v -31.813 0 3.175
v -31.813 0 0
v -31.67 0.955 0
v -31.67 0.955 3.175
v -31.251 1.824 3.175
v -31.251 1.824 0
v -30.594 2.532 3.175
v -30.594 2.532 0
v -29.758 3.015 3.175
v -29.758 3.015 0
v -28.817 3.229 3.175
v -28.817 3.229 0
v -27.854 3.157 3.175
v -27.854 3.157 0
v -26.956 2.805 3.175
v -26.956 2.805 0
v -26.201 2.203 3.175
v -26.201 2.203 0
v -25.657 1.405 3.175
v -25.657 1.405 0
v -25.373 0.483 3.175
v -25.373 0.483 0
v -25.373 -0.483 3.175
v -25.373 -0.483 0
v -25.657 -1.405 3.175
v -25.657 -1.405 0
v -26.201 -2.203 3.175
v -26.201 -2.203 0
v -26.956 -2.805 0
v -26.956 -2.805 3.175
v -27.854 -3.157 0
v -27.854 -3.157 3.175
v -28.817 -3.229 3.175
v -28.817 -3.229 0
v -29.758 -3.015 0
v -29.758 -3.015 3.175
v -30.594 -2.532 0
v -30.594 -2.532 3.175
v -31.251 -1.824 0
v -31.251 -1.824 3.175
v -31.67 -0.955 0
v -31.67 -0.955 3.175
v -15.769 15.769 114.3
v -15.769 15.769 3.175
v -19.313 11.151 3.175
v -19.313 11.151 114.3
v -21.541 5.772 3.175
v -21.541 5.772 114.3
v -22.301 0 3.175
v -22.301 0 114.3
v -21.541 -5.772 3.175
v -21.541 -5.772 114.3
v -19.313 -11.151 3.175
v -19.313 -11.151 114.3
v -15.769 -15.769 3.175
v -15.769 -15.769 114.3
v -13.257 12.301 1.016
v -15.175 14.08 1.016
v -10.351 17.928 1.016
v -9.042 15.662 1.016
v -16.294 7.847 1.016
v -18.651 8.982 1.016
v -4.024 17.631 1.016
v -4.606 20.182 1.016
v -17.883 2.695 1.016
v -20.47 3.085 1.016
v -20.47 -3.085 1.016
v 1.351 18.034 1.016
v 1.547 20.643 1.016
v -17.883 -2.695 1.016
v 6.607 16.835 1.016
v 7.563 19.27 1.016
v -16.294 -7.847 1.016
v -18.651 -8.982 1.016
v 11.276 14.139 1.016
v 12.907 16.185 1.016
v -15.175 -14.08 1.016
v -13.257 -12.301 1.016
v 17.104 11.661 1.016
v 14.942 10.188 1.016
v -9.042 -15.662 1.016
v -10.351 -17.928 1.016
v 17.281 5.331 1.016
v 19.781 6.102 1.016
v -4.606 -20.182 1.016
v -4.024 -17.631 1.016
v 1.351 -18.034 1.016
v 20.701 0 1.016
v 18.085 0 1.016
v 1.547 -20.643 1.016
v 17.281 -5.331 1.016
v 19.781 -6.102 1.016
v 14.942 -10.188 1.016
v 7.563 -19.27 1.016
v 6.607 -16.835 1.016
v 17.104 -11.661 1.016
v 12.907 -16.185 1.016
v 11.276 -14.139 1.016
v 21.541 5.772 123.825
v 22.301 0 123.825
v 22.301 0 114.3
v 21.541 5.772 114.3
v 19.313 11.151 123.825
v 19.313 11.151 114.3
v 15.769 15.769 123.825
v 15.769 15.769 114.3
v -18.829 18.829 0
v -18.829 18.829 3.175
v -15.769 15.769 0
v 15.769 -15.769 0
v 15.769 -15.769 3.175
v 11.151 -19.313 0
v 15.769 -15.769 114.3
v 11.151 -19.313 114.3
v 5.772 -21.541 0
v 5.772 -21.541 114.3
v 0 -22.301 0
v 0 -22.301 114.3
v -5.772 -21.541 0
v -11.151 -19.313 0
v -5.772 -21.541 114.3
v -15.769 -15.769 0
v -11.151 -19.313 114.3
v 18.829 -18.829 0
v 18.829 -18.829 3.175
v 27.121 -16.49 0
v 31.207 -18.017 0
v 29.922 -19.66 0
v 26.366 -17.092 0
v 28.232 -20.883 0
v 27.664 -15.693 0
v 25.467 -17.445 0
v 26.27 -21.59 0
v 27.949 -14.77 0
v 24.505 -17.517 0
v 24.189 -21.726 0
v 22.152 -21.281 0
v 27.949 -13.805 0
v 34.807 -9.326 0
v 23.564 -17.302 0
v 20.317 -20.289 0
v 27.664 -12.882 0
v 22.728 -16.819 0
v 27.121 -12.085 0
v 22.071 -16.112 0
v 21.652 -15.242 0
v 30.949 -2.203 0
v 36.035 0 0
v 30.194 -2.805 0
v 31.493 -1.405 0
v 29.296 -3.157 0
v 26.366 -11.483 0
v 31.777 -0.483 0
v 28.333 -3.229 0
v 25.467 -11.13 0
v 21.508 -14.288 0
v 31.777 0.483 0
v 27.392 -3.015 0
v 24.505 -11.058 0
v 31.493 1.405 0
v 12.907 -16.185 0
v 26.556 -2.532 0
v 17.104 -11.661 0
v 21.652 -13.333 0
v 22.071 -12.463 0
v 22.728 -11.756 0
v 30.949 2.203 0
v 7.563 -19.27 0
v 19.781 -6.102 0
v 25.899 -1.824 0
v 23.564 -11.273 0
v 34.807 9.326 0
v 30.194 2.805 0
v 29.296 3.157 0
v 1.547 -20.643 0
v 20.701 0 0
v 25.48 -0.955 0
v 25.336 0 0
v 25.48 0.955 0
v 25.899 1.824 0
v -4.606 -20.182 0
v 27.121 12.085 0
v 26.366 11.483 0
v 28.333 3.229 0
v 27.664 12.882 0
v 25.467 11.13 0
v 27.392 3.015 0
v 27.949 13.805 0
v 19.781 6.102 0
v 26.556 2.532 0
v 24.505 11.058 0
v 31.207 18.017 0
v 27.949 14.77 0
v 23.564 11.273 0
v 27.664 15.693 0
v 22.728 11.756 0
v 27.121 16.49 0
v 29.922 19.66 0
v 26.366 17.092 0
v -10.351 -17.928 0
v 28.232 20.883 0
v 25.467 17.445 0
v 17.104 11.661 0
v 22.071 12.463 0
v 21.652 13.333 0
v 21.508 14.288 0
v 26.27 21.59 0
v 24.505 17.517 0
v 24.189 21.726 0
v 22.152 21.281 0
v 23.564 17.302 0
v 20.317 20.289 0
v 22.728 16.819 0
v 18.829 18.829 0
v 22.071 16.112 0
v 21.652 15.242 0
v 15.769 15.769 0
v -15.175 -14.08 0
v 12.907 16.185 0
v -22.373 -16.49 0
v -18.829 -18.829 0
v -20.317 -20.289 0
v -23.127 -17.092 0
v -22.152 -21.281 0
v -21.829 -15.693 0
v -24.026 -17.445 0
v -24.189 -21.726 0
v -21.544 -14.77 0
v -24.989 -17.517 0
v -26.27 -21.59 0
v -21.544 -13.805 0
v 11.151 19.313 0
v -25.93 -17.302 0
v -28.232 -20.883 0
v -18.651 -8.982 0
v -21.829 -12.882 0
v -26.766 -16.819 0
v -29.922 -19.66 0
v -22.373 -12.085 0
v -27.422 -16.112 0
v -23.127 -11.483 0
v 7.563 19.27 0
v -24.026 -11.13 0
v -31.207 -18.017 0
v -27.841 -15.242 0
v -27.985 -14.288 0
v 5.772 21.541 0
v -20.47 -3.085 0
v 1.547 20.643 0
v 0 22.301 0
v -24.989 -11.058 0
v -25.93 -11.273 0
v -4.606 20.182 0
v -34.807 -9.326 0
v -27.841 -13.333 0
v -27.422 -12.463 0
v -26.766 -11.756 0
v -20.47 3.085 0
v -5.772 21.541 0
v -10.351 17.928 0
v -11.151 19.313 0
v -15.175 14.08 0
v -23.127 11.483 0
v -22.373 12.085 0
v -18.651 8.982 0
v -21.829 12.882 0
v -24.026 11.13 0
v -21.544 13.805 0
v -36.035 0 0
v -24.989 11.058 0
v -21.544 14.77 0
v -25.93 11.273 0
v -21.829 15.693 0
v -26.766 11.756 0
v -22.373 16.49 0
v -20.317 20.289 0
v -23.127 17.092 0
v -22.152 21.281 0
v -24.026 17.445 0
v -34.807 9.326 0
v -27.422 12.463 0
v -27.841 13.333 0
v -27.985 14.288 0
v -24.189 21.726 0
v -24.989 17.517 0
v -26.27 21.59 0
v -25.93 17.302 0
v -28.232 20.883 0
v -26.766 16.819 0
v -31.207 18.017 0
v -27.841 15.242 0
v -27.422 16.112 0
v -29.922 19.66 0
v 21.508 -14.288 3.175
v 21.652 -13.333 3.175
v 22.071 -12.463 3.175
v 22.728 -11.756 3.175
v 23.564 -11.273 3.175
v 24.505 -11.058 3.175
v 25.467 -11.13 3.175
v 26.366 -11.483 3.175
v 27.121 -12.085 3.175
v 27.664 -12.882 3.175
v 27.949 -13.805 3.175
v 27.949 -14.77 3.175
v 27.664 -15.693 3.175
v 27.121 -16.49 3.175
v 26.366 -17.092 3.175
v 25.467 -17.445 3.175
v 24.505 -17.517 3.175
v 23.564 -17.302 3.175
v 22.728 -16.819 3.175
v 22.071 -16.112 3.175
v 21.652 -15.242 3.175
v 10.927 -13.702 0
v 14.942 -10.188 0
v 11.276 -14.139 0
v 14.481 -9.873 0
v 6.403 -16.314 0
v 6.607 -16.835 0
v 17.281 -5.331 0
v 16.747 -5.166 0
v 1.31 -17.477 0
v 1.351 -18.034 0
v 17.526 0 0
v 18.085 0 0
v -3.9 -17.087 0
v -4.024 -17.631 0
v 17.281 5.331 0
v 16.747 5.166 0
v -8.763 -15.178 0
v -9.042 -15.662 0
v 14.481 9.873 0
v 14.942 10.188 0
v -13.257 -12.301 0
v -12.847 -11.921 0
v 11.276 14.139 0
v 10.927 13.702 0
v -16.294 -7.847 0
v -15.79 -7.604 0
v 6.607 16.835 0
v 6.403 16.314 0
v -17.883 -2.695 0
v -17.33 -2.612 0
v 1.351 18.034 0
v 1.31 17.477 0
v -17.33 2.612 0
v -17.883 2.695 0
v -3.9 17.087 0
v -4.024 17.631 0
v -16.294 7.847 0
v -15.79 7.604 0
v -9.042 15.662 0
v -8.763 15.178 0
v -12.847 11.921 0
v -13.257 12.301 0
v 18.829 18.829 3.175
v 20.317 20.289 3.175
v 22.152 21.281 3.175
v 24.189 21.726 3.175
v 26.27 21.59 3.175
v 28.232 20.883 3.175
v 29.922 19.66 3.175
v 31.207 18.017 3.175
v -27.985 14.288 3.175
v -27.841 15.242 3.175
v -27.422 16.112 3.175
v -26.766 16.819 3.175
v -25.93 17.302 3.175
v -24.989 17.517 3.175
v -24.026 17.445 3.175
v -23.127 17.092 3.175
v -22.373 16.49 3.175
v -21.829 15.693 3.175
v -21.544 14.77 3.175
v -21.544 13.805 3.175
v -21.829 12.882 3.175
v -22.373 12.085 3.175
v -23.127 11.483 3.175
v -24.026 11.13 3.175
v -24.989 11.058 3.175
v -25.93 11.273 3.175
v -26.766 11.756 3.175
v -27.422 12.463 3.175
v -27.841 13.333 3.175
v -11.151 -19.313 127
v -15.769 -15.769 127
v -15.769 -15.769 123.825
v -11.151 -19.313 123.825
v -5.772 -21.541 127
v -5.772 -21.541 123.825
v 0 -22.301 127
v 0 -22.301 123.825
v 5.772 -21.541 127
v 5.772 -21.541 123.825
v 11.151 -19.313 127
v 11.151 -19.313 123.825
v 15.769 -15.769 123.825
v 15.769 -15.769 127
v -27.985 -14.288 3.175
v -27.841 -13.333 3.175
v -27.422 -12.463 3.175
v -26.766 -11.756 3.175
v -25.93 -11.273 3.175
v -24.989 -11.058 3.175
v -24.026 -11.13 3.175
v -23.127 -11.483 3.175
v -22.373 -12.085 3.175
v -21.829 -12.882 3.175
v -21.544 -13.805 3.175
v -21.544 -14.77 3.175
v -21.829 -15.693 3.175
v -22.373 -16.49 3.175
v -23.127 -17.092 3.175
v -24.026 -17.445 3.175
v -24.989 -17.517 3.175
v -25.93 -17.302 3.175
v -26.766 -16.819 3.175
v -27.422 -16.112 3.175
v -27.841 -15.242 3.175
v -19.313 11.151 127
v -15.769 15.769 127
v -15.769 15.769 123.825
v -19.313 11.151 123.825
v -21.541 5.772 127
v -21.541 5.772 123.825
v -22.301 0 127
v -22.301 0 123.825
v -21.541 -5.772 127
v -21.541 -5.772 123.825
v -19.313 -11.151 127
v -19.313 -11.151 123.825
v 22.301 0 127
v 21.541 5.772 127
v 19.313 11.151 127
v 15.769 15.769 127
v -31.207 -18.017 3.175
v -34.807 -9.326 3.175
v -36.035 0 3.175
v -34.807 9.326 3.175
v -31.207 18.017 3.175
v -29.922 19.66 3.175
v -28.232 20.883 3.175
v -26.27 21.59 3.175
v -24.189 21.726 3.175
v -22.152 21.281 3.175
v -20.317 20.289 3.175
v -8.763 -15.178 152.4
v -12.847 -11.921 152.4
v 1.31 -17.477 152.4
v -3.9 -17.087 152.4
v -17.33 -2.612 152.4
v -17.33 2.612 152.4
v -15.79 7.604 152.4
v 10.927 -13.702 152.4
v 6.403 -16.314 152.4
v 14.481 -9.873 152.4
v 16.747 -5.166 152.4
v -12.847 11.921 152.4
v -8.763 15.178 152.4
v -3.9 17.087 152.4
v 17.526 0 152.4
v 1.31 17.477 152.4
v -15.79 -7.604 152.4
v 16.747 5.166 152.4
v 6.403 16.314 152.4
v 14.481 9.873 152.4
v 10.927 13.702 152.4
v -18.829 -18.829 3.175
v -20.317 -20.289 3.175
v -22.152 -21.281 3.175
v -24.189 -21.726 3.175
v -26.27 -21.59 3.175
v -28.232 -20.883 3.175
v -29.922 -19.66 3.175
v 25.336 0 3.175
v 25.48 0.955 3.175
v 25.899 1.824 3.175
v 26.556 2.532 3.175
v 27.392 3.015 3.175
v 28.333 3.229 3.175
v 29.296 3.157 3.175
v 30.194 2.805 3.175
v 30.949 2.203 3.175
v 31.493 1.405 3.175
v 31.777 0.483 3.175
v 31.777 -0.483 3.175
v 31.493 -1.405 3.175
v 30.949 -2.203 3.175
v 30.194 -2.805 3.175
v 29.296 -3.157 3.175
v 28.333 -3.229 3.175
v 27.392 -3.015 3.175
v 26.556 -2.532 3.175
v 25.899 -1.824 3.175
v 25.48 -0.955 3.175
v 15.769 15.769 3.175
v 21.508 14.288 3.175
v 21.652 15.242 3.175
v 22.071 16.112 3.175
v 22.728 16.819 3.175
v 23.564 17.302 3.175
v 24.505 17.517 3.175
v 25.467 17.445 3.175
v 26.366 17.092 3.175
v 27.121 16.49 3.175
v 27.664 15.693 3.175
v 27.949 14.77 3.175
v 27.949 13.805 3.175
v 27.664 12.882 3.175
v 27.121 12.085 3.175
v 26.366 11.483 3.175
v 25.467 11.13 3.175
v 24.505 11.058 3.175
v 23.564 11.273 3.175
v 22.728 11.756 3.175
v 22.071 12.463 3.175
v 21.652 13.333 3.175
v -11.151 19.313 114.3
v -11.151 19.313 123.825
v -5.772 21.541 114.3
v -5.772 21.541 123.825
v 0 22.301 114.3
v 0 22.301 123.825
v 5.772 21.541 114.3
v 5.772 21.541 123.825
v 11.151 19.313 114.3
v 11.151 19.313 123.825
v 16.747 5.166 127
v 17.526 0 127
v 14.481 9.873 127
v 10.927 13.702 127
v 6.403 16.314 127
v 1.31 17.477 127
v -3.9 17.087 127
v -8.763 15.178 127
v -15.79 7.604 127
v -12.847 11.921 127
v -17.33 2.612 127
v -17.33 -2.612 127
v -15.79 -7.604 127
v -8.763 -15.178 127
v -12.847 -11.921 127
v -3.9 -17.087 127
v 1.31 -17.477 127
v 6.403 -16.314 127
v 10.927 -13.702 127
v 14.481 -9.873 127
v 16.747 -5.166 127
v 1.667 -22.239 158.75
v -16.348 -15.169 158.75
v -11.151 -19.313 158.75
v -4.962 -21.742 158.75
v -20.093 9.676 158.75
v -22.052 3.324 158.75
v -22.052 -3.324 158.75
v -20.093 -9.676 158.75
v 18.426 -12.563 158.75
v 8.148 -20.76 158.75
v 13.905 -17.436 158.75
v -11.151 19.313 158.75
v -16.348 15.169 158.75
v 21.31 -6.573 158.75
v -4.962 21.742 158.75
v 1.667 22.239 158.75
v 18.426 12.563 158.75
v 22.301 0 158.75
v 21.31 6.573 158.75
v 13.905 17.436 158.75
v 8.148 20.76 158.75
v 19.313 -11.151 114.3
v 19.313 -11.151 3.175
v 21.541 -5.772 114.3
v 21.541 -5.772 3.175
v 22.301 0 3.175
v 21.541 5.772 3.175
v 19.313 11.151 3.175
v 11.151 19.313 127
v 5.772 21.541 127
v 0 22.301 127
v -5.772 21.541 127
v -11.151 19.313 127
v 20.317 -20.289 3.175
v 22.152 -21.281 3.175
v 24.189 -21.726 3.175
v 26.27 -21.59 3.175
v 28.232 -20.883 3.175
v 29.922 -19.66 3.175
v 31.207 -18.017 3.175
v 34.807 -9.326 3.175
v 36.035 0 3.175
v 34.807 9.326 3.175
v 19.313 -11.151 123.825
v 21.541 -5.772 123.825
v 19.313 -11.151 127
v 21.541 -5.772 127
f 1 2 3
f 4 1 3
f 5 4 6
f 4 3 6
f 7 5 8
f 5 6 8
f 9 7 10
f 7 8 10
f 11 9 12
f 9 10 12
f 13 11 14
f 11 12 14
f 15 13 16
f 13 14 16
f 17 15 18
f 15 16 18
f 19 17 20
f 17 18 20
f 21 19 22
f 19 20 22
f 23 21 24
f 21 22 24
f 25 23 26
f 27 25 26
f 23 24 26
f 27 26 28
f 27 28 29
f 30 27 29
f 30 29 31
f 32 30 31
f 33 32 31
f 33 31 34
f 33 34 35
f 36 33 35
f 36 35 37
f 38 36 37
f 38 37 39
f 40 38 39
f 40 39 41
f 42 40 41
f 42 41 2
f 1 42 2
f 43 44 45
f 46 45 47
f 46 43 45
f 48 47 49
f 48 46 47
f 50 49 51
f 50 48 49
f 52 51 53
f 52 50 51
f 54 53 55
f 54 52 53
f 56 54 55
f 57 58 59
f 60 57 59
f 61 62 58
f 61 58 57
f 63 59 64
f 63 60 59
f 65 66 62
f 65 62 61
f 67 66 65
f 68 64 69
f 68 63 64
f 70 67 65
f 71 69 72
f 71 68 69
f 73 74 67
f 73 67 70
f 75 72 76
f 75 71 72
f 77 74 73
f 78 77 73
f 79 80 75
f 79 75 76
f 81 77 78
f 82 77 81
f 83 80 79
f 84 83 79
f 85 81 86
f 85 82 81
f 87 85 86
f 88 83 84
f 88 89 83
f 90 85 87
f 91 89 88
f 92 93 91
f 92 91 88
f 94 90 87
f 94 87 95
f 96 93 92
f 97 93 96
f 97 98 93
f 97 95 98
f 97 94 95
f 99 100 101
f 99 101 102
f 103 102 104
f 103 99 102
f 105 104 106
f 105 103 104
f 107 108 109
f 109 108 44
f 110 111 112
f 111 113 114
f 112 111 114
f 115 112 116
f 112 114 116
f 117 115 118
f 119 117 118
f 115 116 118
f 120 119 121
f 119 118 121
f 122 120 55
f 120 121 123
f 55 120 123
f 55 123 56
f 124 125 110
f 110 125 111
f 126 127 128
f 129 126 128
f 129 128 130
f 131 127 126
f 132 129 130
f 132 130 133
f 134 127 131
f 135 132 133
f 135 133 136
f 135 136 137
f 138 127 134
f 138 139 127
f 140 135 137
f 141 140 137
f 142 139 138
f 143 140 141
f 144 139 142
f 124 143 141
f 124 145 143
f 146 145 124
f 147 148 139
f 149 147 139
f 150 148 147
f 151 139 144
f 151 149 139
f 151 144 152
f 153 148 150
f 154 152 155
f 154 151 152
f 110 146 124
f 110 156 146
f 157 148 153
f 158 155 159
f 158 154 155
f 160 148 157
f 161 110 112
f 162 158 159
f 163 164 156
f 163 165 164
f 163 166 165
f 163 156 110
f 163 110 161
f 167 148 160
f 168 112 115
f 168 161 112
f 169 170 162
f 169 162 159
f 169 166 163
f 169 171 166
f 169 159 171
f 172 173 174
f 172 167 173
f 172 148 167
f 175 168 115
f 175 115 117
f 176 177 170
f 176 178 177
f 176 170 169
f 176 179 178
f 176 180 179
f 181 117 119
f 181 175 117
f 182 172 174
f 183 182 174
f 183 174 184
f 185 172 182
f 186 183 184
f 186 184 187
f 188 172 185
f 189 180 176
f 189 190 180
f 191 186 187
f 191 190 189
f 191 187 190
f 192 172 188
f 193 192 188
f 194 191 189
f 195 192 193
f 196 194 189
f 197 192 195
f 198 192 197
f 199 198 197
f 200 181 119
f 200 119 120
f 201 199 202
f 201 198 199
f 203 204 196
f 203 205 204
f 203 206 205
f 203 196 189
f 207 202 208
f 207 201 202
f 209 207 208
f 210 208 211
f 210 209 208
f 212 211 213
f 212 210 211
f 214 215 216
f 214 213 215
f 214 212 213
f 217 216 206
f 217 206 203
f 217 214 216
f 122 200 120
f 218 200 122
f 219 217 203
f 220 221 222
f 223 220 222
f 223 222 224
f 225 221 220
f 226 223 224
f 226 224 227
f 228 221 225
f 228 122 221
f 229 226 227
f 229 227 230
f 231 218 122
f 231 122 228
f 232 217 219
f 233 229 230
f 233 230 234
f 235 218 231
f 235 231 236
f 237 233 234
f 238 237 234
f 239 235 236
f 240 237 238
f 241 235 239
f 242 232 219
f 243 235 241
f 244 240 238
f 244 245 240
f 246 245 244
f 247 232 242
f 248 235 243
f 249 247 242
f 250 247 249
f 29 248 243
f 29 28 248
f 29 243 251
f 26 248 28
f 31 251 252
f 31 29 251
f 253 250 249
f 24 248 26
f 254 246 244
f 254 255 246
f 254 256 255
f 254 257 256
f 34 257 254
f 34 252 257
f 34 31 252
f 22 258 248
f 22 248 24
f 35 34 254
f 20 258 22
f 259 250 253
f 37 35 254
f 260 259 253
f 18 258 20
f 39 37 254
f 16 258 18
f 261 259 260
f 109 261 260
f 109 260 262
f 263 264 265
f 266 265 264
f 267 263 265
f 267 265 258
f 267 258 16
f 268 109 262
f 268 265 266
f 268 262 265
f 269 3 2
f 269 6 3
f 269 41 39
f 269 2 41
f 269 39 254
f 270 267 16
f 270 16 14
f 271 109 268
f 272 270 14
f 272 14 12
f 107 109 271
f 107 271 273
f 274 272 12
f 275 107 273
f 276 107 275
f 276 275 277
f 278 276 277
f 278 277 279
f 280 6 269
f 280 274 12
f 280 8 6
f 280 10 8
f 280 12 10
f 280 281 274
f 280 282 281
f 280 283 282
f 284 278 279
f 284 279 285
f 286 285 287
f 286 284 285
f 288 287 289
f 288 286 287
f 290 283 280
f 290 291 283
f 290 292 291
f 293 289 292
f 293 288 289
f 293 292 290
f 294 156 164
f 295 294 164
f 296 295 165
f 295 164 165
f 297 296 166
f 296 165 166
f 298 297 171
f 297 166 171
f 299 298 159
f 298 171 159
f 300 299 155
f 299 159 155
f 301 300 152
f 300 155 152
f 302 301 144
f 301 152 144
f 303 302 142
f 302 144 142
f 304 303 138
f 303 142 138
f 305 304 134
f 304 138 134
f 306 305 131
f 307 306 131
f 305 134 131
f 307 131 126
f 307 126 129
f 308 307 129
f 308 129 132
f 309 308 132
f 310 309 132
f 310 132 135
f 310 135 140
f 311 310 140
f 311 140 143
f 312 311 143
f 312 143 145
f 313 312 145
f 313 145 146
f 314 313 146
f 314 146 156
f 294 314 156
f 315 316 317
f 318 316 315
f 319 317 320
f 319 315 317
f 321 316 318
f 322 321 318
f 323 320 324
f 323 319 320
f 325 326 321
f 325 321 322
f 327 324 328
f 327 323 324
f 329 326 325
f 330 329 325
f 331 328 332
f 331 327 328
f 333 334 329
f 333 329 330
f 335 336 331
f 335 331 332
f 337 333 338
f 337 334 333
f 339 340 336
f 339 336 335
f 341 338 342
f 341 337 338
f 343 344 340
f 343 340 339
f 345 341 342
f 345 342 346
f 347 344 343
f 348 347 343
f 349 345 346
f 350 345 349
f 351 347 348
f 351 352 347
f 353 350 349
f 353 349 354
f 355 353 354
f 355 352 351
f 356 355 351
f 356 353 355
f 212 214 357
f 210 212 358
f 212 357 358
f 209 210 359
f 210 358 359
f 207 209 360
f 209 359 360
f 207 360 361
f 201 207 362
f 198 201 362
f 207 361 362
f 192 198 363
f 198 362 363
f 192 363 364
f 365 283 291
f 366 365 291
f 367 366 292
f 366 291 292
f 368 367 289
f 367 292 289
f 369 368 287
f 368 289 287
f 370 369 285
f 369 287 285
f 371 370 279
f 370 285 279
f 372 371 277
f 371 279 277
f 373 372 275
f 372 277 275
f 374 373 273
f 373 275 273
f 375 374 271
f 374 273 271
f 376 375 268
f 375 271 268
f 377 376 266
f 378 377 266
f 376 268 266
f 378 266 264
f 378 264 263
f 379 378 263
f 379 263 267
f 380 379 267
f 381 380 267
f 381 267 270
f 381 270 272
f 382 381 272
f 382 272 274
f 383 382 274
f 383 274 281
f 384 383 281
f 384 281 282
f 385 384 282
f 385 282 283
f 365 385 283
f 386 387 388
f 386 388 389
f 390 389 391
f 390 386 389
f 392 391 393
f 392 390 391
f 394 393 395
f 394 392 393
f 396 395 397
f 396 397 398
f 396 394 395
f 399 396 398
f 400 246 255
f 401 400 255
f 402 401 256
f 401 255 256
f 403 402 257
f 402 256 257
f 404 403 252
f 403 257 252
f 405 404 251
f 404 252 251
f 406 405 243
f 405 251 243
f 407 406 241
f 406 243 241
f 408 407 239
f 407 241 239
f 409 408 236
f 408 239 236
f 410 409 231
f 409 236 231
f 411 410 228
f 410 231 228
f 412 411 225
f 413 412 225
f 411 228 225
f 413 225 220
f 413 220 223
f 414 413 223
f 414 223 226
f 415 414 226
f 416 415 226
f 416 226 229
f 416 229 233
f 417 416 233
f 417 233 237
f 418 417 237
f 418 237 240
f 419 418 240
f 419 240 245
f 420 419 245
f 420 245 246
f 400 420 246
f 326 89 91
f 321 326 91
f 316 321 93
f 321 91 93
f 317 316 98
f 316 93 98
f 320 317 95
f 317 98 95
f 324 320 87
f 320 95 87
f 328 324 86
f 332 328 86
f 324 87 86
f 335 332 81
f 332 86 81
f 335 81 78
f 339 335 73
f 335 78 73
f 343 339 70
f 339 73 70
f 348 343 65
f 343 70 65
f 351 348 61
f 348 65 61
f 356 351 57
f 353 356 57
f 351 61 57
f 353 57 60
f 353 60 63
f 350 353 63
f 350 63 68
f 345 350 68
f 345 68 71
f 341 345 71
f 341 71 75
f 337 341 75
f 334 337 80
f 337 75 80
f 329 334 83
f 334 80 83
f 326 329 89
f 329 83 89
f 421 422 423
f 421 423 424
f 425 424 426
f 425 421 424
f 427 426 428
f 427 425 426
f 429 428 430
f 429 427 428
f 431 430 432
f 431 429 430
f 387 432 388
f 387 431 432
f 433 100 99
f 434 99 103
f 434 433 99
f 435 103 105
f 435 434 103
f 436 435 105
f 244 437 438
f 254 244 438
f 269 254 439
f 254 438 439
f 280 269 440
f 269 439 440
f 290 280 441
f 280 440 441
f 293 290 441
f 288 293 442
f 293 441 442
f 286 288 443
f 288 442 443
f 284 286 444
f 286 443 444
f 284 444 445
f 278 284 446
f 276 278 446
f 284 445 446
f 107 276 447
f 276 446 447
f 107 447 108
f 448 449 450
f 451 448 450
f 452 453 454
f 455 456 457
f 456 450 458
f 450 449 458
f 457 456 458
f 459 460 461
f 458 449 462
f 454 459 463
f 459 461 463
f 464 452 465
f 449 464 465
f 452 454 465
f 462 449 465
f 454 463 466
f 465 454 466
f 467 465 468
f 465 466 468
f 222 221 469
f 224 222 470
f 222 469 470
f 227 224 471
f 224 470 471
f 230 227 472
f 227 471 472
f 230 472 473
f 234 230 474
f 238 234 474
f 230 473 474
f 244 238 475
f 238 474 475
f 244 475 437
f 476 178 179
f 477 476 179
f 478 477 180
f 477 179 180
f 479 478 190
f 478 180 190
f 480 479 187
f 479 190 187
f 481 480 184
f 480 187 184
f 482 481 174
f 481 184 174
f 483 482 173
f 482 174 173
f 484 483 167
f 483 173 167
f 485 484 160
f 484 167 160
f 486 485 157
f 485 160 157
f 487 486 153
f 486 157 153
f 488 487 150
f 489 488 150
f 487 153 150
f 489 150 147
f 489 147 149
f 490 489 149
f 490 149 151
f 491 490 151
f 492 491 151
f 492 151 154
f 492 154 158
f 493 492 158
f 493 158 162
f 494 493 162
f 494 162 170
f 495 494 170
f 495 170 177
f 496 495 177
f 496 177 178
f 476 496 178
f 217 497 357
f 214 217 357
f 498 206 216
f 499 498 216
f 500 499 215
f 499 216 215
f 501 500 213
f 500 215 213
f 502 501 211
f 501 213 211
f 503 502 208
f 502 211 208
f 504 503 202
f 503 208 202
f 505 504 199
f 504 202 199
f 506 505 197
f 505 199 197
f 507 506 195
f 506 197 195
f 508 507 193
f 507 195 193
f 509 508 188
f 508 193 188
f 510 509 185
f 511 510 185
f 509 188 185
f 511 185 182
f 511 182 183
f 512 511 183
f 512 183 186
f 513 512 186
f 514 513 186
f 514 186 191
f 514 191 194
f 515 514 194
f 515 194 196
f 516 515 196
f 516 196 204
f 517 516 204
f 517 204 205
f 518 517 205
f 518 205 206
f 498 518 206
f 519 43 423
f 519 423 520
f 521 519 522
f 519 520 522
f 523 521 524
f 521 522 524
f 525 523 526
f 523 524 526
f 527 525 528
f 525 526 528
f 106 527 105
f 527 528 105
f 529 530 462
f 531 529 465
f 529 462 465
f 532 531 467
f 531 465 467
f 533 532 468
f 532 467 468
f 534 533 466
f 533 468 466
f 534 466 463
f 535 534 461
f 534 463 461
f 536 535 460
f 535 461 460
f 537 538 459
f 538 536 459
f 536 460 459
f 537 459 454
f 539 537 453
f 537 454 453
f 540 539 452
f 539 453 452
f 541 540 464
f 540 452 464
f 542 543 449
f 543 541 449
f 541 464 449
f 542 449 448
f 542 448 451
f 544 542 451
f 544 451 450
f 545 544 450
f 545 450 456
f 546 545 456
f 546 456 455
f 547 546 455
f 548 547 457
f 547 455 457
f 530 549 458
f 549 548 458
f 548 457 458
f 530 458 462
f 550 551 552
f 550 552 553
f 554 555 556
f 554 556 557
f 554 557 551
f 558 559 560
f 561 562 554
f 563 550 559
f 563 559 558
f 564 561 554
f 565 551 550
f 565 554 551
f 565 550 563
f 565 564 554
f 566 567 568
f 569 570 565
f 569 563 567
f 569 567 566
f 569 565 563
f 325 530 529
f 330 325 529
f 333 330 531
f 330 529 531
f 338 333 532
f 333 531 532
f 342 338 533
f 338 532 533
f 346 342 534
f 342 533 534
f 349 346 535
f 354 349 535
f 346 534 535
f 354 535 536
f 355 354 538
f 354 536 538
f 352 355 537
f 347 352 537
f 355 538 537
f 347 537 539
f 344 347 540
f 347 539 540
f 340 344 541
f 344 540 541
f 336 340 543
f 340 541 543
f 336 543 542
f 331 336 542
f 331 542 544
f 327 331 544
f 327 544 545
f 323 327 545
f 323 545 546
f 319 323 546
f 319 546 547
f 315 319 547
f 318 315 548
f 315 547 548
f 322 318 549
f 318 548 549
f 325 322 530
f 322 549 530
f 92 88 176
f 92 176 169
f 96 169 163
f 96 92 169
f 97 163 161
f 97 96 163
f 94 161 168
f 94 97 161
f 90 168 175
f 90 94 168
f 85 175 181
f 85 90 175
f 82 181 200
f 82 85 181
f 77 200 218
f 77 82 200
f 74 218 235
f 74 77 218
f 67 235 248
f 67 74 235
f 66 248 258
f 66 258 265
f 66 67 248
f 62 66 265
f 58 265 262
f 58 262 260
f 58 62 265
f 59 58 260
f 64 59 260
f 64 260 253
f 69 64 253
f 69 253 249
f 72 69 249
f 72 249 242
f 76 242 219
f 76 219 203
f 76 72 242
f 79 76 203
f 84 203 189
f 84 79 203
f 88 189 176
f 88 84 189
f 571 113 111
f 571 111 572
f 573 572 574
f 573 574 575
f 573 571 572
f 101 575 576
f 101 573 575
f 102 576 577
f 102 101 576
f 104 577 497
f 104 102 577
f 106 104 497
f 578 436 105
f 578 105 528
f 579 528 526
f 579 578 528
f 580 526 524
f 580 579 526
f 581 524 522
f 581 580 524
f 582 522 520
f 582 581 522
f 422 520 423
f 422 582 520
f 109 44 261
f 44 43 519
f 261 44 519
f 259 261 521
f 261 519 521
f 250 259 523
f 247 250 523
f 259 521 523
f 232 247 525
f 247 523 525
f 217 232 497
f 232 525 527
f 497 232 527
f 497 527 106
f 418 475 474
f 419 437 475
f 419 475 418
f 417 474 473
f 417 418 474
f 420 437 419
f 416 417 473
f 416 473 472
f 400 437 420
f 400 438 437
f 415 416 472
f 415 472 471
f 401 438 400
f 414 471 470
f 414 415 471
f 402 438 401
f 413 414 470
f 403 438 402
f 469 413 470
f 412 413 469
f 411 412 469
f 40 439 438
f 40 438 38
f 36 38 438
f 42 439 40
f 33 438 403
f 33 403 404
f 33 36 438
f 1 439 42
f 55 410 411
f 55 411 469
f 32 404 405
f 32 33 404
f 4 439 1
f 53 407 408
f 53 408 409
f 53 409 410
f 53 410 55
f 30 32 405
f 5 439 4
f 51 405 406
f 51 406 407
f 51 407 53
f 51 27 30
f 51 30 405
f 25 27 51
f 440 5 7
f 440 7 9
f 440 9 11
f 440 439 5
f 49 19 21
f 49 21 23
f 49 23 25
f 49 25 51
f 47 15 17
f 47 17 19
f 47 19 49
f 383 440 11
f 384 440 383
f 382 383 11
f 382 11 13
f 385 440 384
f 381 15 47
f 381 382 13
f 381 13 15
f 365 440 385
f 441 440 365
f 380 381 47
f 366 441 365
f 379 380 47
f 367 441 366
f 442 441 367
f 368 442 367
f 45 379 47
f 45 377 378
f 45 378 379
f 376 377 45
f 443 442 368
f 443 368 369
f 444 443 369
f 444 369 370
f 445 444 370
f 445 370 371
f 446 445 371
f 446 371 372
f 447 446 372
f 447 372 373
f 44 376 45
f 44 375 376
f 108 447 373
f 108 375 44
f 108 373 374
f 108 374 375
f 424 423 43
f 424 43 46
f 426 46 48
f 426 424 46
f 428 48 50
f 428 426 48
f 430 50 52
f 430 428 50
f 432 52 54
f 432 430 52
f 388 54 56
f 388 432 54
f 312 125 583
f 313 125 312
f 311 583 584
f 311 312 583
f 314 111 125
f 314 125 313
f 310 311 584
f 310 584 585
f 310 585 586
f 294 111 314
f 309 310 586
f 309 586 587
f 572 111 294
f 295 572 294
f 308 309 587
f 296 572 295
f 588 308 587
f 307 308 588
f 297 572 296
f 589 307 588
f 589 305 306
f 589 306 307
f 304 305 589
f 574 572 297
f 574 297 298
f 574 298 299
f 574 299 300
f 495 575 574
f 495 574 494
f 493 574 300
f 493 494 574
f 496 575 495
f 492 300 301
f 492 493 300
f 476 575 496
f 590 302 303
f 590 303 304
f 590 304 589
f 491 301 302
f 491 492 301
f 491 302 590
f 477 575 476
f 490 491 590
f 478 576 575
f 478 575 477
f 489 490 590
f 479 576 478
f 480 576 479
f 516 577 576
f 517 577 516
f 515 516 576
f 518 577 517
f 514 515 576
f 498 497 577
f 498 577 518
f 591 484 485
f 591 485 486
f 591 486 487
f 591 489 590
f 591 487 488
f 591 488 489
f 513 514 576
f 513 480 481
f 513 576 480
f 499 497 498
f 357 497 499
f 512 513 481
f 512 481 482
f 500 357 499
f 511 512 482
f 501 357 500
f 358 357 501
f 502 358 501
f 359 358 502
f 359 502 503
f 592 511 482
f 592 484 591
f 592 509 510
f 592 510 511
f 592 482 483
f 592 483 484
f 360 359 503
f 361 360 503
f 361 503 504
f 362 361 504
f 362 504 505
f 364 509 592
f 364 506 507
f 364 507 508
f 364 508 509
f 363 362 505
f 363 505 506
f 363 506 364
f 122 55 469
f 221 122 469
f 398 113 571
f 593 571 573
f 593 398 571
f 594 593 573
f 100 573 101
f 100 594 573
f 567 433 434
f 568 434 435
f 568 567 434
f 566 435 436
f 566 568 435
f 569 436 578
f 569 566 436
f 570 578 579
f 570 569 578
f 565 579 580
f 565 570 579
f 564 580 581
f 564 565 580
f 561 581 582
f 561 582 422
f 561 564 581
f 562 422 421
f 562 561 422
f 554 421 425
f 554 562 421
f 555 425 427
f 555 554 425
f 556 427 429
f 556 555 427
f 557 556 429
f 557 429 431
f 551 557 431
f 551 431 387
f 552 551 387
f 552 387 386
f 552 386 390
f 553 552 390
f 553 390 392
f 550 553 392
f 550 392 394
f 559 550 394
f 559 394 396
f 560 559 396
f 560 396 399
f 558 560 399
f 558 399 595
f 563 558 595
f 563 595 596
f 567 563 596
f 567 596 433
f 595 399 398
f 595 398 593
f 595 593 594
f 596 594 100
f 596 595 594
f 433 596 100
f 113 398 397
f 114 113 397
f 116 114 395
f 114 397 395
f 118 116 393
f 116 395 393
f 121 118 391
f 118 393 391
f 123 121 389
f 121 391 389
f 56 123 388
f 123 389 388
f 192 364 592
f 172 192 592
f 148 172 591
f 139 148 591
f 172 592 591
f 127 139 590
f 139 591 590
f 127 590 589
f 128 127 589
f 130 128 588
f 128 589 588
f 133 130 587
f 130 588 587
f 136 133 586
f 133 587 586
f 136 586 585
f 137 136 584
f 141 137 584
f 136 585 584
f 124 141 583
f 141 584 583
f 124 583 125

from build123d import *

# Parameters (mm, degrees)
SKETCH1_R            = 21.082
SKETCH1_R_2          = 17.526
BOSS_EXTRUDE1_DEPTH  = 254
BOSS_EXTRUDE2_START  = 6.35
SKETCH2_R            = 21.082
BOSS_EXTRUDE2_DEPTH  = 6.35
SKETCH3_R            = 25.868376463
CUT_EXTRUDE1_DEPTH   = 127
SKETCH4_R            = 34.925
SKETCH4_R_2          = 19.091061219
BOSS_EXTRUDE3_DEPTH  = 3.175
CUT_EXTRUDE2_DEPTH   = 143.203142546
CIRPATTERN1_COUNT    = 12
SKETCH6_R            = 21.082
CUT_EXTRUDE3_DEPTH   = 6.35
SKETCH7_R            = 21.082
BOSS_EXTRUDE4_DEPTH  = 6.35
CUT_EXTRUDE5_DEPTH   = 137.26632471
BOSS_EXTRUDE5_DEPTH  = 3.175
SKETCH13_R           = 20.701
SKETCH13_R_2         = 18.0848
CUT_EXTRUDE6_DEPTH   = 1.016
SKETCH14_R           = 22.3012
SKETCH14_R_2         = 20.701
BOSS_EXTRUDE6_DEPTH  = 3.175
SKETCH15_R           = 3.175
SKETCH15_R_2         = 21.082
BOSS_EXTRUDE7_DEPTH  = 123.825
SKETCH17_R           = 47.464750001
SKETCH17_R_2         = 22.3012
CUT_EXTRUDE7_DEPTH   = 120.65
SKETCH18_R           = 17.526
CUT_EXTRUDE8_DEPTH   = 134.883658048
CUT_EXTRUDE9_START   = -1.016
SKETCH19_R           = 20.701
SKETCH19_R_2         = 18.0848
CUT_EXTRUDE9_DEPTH   = 1.016
SKETCH20_R           = 44.795310745
SKETCH20_R_2         = 22.3012
CUT_EXTRUDE10_DEPTH  = 12.7
BOSS_EXTRUDE8_START  = 31.75
SKETCH22_R           = 22.3012
SKETCH22_R_2         = 20.701
SKETCH22_R_3         = 18.0848
SKETCH22_R_4         = 17.526
BOSS_EXTRUDE8_DEPTH  = 31.75
BOSS_EXTRUDE9_START  = 32.766
SKETCH23_R           = 20.701
SKETCH23_R_2         = 18.0848
BOSS_EXTRUDE9_DEPTH  = 32.766
SKETCH24_R           = 17.526
BOSS_EXTRUDE10_DEPTH = 6.35
SKETCH25_R           = 3.2385
CUT_EXTRUDE11_DEPTH  = 165.308844535


with BuildPart() as part:
    # Sketch1 → Boss-Extrude1 (new body)
    with BuildSketch(Plane.XY):
        Circle(SKETCH1_R)
        Circle(SKETCH1_R_2, mode=Mode.SUBTRACT)
    extrude(amount=BOSS_EXTRUDE1_DEPTH)

    # Sketch2 → Boss-Extrude2 (add)
    with BuildSketch(Plane(origin=(0, 0, 0), x_dir=(-1, 0, 0), z_dir=(0, 0, -1)).offset(BOSS_EXTRUDE2_START)):
        Circle(SKETCH2_R)
    extrude(amount=-BOSS_EXTRUDE2_DEPTH)

    # Sketch3 → Cut-Extrude1 (cut)
    with BuildSketch(Plane.XY.offset(254)):
        Circle(SKETCH3_R)
    extrude(amount=-CUT_EXTRUDE1_DEPTH, mode=Mode.SUBTRACT)

    # Sketch4 → Boss-Extrude3 (add)
    with BuildSketch(Plane.XY.offset(127)):
        Circle(SKETCH4_R)
        Circle(SKETCH4_R_2, mode=Mode.SUBTRACT)
    extrude(amount=-BOSS_EXTRUDE3_DEPTH)

    # Sketch5 → Cut-Extrude2 (cut, through all)
    with BuildSketch(Plane.XY.offset(127)):
        with BuildLine():
            ThreePointArc((0, 31.75), (-3.175, 28.575), (0, 25.4))
            Line((0, 25.4), (0, 31.75))
        make_face()
        with BuildLine():
            Line((0, 31.75), (0, 25.4))
            ThreePointArc((0, 25.4), (2.24506403, 26.32993597), (3.175, 28.575))
            ThreePointArc((3.175, 28.575), (2.24506403, 30.82006403), (0, 31.75))
        make_face()
    cut_extrude2 = extrude(amount=-CUT_EXTRUDE2_DEPTH, mode=Mode.SUBTRACT)

    # CirPattern1: Cut-Extrude2 ×12 about axis
    cirpattern1_axis = Axis((0, 0, 0), (0, 0, 1))
    for i in range(1, CIRPATTERN1_COUNT):
        add(cut_extrude2.rotate(cirpattern1_axis, i * 360 / CIRPATTERN1_COUNT), mode=Mode.SUBTRACT)

    # Sketch6 → Cut-Extrude3 (cut)
    with BuildSketch(Plane(origin=(0, 0, -6.35), x_dir=(-1, 0, 0), z_dir=(0, 0, -1))):
        Circle(SKETCH6_R)
    extrude(amount=-CUT_EXTRUDE3_DEPTH, mode=Mode.SUBTRACT)

    # Sketch7 → Boss-Extrude4 (add)
    with BuildSketch(Plane(origin=(0, 0, 0), x_dir=(-1, 0, 0), z_dir=(0, 0, -1))):
        Circle(SKETCH7_R)
    extrude(amount=-BOSS_EXTRUDE4_DEPTH)

    # Sketch8 → Cut-Extrude5 (cut, through all)
    with BuildSketch(Plane.XY.offset(127)):
        with BuildLine():
            ThreePointArc((18.828599641, 18.828599641), (22.949516837, 21.527350272), (27.854121372, 21.069018667))
            ThreePointArc((27.854121372, 21.069018667), (0, 34.925), (-27.854121372, 21.069018667))
            ThreePointArc((-27.854121372, 21.069018667), (-22.949516837, 21.527350272), (-18.828599641, 18.828599641))
            Line((-18.828599641, 18.828599641), (-14.907225161, 14.907225161))
            ThreePointArc((-14.907225161, 14.907225161), (0, 21.082), (14.907225161, 14.907225161))
            Line((14.907225161, 14.907225161), (18.828599641, 18.828599641))
        make_face()
        with BuildLine():
            ThreePointArc((14.907225161, -14.907225161), (0, -21.082), (-14.907225161, -14.907225161))
            Line((-14.907225161, -14.907225161), (-18.828599641, -18.828599641))
            ThreePointArc((-18.828599641, -18.828599641), (-22.949516837, -21.527350272), (-27.854121372, -21.069018667))
            ThreePointArc((-27.854121372, -21.069018667), (0, -34.925), (27.854121372, -21.069018667))
            ThreePointArc((27.854121372, -21.069018667), (22.949516837, -21.527350272), (18.828599641, -18.828599641))
            Line((18.828599641, -18.828599641), (14.907225161, -14.907225161))
        make_face()
    extrude(amount=-CUT_EXTRUDE5_DEPTH, mode=Mode.SUBTRACT)

    # Sketch11 → Boss-Extrude5 (add)
    with BuildSketch(Plane.XY.offset(127)):
        with BuildLine():
            ThreePointArc((31.206854634, 18.017286001), (29.767943301, 19.804028486), (27.854121372, 21.069018667))
            ThreePointArc((27.854121372, 21.069018667), (34.925, 0), (27.854121372, -21.069018667))
            ThreePointArc((27.854121372, -21.069018667), (29.767943301, -19.804028486), (31.206854634, -18.017286001))
            ThreePointArc((31.206854634, -18.017286001), (36.034571885, 0), (31.206854634, 18.017286001))
        make_face()
        with BuildLine():
            ThreePointArc((-27.854121372, 21.069018667), (-29.767943301, 19.804028486), (-31.206854634, 18.017286001))
            ThreePointArc((-31.206854634, 18.017286001), (-36.034571885, -1.77e-07), (-31.206854456, -18.017286308))
            ThreePointArc((-31.206854456, -18.017286308), (-29.767943169, -19.804028605), (-27.854121372, -21.069018667))
            ThreePointArc((-27.854121372, -21.069018667), (-34.925, 0), (-27.854121372, 21.069018667))
        make_face()
    extrude(amount=-BOSS_EXTRUDE5_DEPTH)

    # Sketch13 → Cut-Extrude6 (cut)
    with BuildSketch(Plane.XY.offset(127)):
        Circle(SKETCH13_R)
        Circle(SKETCH13_R_2, mode=Mode.SUBTRACT)
    extrude(amount=-CUT_EXTRUDE6_DEPTH, mode=Mode.SUBTRACT)

    # Sketch14 → Boss-Extrude6 (add)
    with BuildSketch(Plane.XY.offset(127)):
        Circle(SKETCH14_R)
        Circle(SKETCH14_R_2, mode=Mode.SUBTRACT)
    extrude(amount=-BOSS_EXTRUDE6_DEPTH)

    # Sketch15 → Boss-Extrude7 (add)
    with BuildSketch(Plane(origin=(0, 0, 123.825), x_dir=(-1, 0, 0), z_dir=(0, 0, -1))):
        with BuildLine():
            ThreePointArc((31.206854667, 18.017285943), (25.234555257, 21.731100369), (18.828599641, 18.828599641))
            Line((18.828599641, 18.828599641), (15.769329749, 15.769329749))
            ThreePointArc((15.769329749, 15.769329749), (0, 22.3012), (-15.769329749, 15.769329749))
            Line((-15.769329749, 15.769329749), (-18.828599641, 18.828599641))
            ThreePointArc((-18.828599641, 18.828599641), (-25.234555257, 21.731100369), (-31.206854667, 18.017285943))
            ThreePointArc((-31.206854667, 18.017285943), (-36.034571885, 0), (-31.206854667, -18.017285943))
            ThreePointArc((-31.206854667, -18.017285943), (-25.234555257, -21.731100369), (-18.828599641, -18.828599641))
            Line((-18.828599641, -18.828599641), (-15.769329749, -15.769329749))
            ThreePointArc((-15.769329749, -15.769329749), (0, -22.3012), (15.769329749, -15.769329749))
            Line((15.769329749, -15.769329749), (18.828599641, -18.828599641))
            ThreePointArc((18.828599641, -18.828599641), (25.234555257, -21.731100369), (31.206854667, -18.017285943))
            ThreePointArc((31.206854667, -18.017285943), (36.034571885, 0), (31.206854667, 18.017285943))
        make_face()
        with Locations(Location((28.575, 0, 0), (0, 0, 90))):
            Circle(SKETCH15_R, mode=Mode.SUBTRACT)
        with Locations(Location((-24.746675913, -14.2875, 0), (0, 0, 300))):
            Circle(SKETCH15_R, mode=Mode.SUBTRACT)
        with Locations(Location((-24.746675913, 14.2875, 0), (0, 0, 240))):
            Circle(SKETCH15_R, mode=Mode.SUBTRACT)
        with Locations(Location((-28.575, 0, 0), (0, 0, 270))):
            Circle(SKETCH15_R, mode=Mode.SUBTRACT)
        Circle(SKETCH15_R_2, mode=Mode.SUBTRACT)
        with Locations(Location((24.746675913, -14.2875, 0), (0, 0, 60))):
            Circle(SKETCH15_R, mode=Mode.SUBTRACT)
        with Locations(Location((24.746675913, 14.2875, 0), (0, 0, 120))):
            Circle(SKETCH15_R, mode=Mode.SUBTRACT)
    extrude(amount=BOSS_EXTRUDE7_DEPTH)

    # Sketch17 → Cut-Extrude7 (cut)
    with BuildSketch(Plane.XY.offset(123.825)):
        Circle(SKETCH17_R)
        with Locations(Location((0, 0, 0), (0, 0, 315))):
            Circle(SKETCH17_R_2, mode=Mode.SUBTRACT)
    extrude(amount=-CUT_EXTRUDE7_DEPTH, mode=Mode.SUBTRACT)

    # Sketch18 → Cut-Extrude8 (cut, through all)
    with BuildSketch(Plane.XY.offset(127)):
        Circle(SKETCH18_R)
    extrude(amount=-CUT_EXTRUDE8_DEPTH, mode=Mode.SUBTRACT)

    # Sketch19 → Cut-Extrude9 (cut)
    with BuildSketch(Plane(origin=(0, 0, 0), x_dir=(-1, 0, 0), z_dir=(0, 0, -1)).offset(CUT_EXTRUDE9_START)):
        with Locations(Location((0, 0, 0), (0, 0, 180))):
            Circle(SKETCH19_R)
        with Locations(Location((0, 0, 0), (0, 0, 180))):
            Circle(SKETCH19_R_2, mode=Mode.SUBTRACT)
    extrude(amount=CUT_EXTRUDE9_DEPTH, mode=Mode.SUBTRACT)

    # Sketch20 → Cut-Extrude10 (cut)
    with BuildSketch(Plane.XY.offset(127)):
        Circle(SKETCH20_R)
        Circle(SKETCH20_R_2, mode=Mode.SUBTRACT)
    extrude(amount=-CUT_EXTRUDE10_DEPTH, mode=Mode.SUBTRACT)

    # Sketch22 → Boss-Extrude8 (add)
    # profile 1 of 2: a face of its own
    with BuildSketch(Plane.XY.offset(127).offset(BOSS_EXTRUDE8_START)):
        Circle(SKETCH22_R)
        Circle(SKETCH22_R_2, mode=Mode.SUBTRACT)
    # profile 2 of 2: a face of its own
    with BuildSketch(Plane.XY.offset(127).offset(BOSS_EXTRUDE8_START)):
        Circle(SKETCH22_R_3)
        Circle(SKETCH22_R_4, mode=Mode.SUBTRACT)
    extrude(amount=-BOSS_EXTRUDE8_DEPTH)

    # Sketch23 → Boss-Extrude9 (add)
    with BuildSketch(Plane.XY.offset(125.984).offset(BOSS_EXTRUDE9_START)):
        with Locations(Location((0, 0, 0), (0, 0, 180))):
            Circle(SKETCH23_R)
        with Locations(Location((0, 0, 0), (0, 0, 180))):
            Circle(SKETCH23_R_2, mode=Mode.SUBTRACT)
    extrude(amount=-BOSS_EXTRUDE9_DEPTH)

    # Sketch24 → Boss-Extrude10 (add)
    with BuildSketch(Plane.XY.offset(158.75)):
        Circle(SKETCH24_R)
    extrude(amount=-BOSS_EXTRUDE10_DEPTH)

    # Sketch25 → Cut-Extrude11 (cut, through all)
    with BuildSketch(Plane(origin=(0, 0, 0), x_dir=(-1, 0, 0), z_dir=(0, 0, -1))):
        with Locations((-24.746675913, 14.2875)):
            Circle(SKETCH25_R)
        with Locations((-28.575, 0)):
            Circle(SKETCH25_R)
        with Locations((-24.746675913, -14.2875)):
            Circle(SKETCH25_R)
        with Locations((24.746675913, 14.2875)):
            Circle(SKETCH25_R)
        with Locations((28.575, 0)):
            Circle(SKETCH25_R)
        with Locations((24.746675913, -14.2875)):
            Circle(SKETCH25_R)
    extrude(amount=-CUT_EXTRUDE11_DEPTH, mode=Mode.SUBTRACT)


solid = part.part
